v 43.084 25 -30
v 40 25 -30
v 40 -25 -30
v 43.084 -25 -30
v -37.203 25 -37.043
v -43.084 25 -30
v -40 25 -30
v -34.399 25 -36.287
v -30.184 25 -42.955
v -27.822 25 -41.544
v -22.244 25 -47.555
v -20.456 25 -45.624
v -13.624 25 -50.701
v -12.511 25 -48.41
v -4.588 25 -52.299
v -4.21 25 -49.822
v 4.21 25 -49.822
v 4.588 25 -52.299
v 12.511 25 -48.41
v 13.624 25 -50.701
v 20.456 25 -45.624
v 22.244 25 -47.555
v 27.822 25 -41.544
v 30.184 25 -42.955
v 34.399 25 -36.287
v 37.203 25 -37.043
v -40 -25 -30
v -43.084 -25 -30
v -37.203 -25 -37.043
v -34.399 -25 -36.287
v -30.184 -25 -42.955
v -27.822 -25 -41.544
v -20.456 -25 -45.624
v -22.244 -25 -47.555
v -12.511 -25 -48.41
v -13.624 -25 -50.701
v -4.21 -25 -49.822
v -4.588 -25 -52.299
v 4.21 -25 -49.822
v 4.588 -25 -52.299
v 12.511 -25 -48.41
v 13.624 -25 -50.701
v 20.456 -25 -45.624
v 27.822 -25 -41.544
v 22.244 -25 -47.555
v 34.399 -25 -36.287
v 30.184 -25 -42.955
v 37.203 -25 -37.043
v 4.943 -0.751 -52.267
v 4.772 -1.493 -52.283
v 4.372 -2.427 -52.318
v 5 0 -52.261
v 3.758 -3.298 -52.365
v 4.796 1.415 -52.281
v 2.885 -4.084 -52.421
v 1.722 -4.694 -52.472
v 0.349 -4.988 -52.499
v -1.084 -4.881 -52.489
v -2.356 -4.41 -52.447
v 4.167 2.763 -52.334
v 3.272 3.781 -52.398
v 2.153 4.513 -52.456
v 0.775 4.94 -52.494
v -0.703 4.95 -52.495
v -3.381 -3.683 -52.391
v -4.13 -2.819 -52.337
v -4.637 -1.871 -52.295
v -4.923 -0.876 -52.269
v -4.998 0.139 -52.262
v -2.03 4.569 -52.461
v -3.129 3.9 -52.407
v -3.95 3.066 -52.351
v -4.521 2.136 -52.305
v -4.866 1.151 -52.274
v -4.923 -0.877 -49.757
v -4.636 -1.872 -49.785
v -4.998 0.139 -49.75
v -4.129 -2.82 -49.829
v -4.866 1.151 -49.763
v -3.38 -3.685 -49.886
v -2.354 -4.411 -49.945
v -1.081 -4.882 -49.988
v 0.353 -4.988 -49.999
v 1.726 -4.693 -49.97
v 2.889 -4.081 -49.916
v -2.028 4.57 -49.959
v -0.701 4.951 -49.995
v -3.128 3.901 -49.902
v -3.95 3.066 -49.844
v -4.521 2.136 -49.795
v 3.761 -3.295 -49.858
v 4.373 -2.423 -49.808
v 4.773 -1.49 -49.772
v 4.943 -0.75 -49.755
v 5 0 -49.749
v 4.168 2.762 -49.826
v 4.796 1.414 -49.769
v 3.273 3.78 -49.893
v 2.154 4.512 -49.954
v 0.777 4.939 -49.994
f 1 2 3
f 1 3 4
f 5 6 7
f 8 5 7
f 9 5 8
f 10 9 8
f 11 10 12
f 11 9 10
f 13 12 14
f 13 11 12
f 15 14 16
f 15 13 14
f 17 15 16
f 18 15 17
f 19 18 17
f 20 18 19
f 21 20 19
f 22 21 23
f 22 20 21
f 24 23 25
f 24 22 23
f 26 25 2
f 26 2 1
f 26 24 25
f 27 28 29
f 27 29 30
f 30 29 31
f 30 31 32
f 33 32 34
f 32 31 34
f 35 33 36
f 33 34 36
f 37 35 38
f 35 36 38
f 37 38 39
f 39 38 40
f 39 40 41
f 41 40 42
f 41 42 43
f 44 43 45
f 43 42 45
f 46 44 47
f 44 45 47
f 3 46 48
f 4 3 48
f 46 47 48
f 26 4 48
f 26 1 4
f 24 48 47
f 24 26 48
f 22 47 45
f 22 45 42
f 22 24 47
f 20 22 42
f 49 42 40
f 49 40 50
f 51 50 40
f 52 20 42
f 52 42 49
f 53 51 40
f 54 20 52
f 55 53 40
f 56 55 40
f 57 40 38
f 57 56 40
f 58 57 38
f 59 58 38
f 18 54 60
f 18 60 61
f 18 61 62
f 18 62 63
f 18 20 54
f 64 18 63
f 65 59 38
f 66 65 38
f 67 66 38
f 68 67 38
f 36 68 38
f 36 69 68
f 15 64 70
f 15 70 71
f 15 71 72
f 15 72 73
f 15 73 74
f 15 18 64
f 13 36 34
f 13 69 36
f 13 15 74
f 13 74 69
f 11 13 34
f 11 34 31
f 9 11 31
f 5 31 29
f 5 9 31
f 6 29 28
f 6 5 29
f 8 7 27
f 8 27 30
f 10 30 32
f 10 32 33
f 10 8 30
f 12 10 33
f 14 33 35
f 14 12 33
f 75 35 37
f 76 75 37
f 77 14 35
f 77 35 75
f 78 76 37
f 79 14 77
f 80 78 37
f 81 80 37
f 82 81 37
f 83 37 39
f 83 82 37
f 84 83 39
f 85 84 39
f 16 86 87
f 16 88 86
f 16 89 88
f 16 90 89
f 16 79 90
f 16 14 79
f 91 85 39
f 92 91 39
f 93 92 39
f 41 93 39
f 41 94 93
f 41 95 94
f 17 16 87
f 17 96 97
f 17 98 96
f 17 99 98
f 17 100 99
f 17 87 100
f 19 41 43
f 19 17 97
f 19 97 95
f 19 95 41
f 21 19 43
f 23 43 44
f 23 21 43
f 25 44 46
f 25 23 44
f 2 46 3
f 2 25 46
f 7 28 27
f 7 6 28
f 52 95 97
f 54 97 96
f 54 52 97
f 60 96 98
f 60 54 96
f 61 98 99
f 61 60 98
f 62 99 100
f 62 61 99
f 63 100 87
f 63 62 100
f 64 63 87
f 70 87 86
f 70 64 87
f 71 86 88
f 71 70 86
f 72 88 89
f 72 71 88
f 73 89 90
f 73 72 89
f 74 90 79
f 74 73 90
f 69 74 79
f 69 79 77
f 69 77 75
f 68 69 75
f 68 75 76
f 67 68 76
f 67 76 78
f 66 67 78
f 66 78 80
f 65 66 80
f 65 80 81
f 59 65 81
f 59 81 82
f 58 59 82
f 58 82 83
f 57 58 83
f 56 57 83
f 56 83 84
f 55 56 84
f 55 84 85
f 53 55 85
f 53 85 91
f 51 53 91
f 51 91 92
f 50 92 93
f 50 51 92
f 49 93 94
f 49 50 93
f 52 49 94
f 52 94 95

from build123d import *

# Parameters (mm, degrees)
BOSS_EXTRUDE1_DEPTH     = 25
CUT_EXTRUDE1_DEPTH      = 55.155447556
CUT_EXTRUDE1_DEPTH_BACK = 55.155447556
SKETCH2_R               = 5


with BuildPart() as part:
    # Sketch1 → Boss-Extrude1 (new, symmetric)
    with BuildSketch(Plane(origin=(0, 0, 0), x_dir=(1, 0, 0), z_dir=(0, 1, 0))):
        with BuildLine():
            Line((-43.084219849, 30), (-40, 30))
            ThreePointArc((-40, 30), (0, 50), (40, 30))
            Line((40, 30), (43.084219849, 30))
            ThreePointArc((43.084219849, 30), (0, 52.5), (-43.084219849, 30))
        make_face()
    extrude(amount=BOSS_EXTRUDE1_DEPTH, both=True)

    # Sketch2 → Cut-Extrude1 (cut, two sides: drawn at the far end of the back side and taken through both)
    with BuildSketch(Plane.XY.offset(-51.25).offset(-CUT_EXTRUDE1_DEPTH_BACK)):
        Circle(SKETCH2_R)
    extrude(amount=CUT_EXTRUDE1_DEPTH + CUT_EXTRUDE1_DEPTH_BACK, mode=Mode.SUBTRACT)


solid = part.part
